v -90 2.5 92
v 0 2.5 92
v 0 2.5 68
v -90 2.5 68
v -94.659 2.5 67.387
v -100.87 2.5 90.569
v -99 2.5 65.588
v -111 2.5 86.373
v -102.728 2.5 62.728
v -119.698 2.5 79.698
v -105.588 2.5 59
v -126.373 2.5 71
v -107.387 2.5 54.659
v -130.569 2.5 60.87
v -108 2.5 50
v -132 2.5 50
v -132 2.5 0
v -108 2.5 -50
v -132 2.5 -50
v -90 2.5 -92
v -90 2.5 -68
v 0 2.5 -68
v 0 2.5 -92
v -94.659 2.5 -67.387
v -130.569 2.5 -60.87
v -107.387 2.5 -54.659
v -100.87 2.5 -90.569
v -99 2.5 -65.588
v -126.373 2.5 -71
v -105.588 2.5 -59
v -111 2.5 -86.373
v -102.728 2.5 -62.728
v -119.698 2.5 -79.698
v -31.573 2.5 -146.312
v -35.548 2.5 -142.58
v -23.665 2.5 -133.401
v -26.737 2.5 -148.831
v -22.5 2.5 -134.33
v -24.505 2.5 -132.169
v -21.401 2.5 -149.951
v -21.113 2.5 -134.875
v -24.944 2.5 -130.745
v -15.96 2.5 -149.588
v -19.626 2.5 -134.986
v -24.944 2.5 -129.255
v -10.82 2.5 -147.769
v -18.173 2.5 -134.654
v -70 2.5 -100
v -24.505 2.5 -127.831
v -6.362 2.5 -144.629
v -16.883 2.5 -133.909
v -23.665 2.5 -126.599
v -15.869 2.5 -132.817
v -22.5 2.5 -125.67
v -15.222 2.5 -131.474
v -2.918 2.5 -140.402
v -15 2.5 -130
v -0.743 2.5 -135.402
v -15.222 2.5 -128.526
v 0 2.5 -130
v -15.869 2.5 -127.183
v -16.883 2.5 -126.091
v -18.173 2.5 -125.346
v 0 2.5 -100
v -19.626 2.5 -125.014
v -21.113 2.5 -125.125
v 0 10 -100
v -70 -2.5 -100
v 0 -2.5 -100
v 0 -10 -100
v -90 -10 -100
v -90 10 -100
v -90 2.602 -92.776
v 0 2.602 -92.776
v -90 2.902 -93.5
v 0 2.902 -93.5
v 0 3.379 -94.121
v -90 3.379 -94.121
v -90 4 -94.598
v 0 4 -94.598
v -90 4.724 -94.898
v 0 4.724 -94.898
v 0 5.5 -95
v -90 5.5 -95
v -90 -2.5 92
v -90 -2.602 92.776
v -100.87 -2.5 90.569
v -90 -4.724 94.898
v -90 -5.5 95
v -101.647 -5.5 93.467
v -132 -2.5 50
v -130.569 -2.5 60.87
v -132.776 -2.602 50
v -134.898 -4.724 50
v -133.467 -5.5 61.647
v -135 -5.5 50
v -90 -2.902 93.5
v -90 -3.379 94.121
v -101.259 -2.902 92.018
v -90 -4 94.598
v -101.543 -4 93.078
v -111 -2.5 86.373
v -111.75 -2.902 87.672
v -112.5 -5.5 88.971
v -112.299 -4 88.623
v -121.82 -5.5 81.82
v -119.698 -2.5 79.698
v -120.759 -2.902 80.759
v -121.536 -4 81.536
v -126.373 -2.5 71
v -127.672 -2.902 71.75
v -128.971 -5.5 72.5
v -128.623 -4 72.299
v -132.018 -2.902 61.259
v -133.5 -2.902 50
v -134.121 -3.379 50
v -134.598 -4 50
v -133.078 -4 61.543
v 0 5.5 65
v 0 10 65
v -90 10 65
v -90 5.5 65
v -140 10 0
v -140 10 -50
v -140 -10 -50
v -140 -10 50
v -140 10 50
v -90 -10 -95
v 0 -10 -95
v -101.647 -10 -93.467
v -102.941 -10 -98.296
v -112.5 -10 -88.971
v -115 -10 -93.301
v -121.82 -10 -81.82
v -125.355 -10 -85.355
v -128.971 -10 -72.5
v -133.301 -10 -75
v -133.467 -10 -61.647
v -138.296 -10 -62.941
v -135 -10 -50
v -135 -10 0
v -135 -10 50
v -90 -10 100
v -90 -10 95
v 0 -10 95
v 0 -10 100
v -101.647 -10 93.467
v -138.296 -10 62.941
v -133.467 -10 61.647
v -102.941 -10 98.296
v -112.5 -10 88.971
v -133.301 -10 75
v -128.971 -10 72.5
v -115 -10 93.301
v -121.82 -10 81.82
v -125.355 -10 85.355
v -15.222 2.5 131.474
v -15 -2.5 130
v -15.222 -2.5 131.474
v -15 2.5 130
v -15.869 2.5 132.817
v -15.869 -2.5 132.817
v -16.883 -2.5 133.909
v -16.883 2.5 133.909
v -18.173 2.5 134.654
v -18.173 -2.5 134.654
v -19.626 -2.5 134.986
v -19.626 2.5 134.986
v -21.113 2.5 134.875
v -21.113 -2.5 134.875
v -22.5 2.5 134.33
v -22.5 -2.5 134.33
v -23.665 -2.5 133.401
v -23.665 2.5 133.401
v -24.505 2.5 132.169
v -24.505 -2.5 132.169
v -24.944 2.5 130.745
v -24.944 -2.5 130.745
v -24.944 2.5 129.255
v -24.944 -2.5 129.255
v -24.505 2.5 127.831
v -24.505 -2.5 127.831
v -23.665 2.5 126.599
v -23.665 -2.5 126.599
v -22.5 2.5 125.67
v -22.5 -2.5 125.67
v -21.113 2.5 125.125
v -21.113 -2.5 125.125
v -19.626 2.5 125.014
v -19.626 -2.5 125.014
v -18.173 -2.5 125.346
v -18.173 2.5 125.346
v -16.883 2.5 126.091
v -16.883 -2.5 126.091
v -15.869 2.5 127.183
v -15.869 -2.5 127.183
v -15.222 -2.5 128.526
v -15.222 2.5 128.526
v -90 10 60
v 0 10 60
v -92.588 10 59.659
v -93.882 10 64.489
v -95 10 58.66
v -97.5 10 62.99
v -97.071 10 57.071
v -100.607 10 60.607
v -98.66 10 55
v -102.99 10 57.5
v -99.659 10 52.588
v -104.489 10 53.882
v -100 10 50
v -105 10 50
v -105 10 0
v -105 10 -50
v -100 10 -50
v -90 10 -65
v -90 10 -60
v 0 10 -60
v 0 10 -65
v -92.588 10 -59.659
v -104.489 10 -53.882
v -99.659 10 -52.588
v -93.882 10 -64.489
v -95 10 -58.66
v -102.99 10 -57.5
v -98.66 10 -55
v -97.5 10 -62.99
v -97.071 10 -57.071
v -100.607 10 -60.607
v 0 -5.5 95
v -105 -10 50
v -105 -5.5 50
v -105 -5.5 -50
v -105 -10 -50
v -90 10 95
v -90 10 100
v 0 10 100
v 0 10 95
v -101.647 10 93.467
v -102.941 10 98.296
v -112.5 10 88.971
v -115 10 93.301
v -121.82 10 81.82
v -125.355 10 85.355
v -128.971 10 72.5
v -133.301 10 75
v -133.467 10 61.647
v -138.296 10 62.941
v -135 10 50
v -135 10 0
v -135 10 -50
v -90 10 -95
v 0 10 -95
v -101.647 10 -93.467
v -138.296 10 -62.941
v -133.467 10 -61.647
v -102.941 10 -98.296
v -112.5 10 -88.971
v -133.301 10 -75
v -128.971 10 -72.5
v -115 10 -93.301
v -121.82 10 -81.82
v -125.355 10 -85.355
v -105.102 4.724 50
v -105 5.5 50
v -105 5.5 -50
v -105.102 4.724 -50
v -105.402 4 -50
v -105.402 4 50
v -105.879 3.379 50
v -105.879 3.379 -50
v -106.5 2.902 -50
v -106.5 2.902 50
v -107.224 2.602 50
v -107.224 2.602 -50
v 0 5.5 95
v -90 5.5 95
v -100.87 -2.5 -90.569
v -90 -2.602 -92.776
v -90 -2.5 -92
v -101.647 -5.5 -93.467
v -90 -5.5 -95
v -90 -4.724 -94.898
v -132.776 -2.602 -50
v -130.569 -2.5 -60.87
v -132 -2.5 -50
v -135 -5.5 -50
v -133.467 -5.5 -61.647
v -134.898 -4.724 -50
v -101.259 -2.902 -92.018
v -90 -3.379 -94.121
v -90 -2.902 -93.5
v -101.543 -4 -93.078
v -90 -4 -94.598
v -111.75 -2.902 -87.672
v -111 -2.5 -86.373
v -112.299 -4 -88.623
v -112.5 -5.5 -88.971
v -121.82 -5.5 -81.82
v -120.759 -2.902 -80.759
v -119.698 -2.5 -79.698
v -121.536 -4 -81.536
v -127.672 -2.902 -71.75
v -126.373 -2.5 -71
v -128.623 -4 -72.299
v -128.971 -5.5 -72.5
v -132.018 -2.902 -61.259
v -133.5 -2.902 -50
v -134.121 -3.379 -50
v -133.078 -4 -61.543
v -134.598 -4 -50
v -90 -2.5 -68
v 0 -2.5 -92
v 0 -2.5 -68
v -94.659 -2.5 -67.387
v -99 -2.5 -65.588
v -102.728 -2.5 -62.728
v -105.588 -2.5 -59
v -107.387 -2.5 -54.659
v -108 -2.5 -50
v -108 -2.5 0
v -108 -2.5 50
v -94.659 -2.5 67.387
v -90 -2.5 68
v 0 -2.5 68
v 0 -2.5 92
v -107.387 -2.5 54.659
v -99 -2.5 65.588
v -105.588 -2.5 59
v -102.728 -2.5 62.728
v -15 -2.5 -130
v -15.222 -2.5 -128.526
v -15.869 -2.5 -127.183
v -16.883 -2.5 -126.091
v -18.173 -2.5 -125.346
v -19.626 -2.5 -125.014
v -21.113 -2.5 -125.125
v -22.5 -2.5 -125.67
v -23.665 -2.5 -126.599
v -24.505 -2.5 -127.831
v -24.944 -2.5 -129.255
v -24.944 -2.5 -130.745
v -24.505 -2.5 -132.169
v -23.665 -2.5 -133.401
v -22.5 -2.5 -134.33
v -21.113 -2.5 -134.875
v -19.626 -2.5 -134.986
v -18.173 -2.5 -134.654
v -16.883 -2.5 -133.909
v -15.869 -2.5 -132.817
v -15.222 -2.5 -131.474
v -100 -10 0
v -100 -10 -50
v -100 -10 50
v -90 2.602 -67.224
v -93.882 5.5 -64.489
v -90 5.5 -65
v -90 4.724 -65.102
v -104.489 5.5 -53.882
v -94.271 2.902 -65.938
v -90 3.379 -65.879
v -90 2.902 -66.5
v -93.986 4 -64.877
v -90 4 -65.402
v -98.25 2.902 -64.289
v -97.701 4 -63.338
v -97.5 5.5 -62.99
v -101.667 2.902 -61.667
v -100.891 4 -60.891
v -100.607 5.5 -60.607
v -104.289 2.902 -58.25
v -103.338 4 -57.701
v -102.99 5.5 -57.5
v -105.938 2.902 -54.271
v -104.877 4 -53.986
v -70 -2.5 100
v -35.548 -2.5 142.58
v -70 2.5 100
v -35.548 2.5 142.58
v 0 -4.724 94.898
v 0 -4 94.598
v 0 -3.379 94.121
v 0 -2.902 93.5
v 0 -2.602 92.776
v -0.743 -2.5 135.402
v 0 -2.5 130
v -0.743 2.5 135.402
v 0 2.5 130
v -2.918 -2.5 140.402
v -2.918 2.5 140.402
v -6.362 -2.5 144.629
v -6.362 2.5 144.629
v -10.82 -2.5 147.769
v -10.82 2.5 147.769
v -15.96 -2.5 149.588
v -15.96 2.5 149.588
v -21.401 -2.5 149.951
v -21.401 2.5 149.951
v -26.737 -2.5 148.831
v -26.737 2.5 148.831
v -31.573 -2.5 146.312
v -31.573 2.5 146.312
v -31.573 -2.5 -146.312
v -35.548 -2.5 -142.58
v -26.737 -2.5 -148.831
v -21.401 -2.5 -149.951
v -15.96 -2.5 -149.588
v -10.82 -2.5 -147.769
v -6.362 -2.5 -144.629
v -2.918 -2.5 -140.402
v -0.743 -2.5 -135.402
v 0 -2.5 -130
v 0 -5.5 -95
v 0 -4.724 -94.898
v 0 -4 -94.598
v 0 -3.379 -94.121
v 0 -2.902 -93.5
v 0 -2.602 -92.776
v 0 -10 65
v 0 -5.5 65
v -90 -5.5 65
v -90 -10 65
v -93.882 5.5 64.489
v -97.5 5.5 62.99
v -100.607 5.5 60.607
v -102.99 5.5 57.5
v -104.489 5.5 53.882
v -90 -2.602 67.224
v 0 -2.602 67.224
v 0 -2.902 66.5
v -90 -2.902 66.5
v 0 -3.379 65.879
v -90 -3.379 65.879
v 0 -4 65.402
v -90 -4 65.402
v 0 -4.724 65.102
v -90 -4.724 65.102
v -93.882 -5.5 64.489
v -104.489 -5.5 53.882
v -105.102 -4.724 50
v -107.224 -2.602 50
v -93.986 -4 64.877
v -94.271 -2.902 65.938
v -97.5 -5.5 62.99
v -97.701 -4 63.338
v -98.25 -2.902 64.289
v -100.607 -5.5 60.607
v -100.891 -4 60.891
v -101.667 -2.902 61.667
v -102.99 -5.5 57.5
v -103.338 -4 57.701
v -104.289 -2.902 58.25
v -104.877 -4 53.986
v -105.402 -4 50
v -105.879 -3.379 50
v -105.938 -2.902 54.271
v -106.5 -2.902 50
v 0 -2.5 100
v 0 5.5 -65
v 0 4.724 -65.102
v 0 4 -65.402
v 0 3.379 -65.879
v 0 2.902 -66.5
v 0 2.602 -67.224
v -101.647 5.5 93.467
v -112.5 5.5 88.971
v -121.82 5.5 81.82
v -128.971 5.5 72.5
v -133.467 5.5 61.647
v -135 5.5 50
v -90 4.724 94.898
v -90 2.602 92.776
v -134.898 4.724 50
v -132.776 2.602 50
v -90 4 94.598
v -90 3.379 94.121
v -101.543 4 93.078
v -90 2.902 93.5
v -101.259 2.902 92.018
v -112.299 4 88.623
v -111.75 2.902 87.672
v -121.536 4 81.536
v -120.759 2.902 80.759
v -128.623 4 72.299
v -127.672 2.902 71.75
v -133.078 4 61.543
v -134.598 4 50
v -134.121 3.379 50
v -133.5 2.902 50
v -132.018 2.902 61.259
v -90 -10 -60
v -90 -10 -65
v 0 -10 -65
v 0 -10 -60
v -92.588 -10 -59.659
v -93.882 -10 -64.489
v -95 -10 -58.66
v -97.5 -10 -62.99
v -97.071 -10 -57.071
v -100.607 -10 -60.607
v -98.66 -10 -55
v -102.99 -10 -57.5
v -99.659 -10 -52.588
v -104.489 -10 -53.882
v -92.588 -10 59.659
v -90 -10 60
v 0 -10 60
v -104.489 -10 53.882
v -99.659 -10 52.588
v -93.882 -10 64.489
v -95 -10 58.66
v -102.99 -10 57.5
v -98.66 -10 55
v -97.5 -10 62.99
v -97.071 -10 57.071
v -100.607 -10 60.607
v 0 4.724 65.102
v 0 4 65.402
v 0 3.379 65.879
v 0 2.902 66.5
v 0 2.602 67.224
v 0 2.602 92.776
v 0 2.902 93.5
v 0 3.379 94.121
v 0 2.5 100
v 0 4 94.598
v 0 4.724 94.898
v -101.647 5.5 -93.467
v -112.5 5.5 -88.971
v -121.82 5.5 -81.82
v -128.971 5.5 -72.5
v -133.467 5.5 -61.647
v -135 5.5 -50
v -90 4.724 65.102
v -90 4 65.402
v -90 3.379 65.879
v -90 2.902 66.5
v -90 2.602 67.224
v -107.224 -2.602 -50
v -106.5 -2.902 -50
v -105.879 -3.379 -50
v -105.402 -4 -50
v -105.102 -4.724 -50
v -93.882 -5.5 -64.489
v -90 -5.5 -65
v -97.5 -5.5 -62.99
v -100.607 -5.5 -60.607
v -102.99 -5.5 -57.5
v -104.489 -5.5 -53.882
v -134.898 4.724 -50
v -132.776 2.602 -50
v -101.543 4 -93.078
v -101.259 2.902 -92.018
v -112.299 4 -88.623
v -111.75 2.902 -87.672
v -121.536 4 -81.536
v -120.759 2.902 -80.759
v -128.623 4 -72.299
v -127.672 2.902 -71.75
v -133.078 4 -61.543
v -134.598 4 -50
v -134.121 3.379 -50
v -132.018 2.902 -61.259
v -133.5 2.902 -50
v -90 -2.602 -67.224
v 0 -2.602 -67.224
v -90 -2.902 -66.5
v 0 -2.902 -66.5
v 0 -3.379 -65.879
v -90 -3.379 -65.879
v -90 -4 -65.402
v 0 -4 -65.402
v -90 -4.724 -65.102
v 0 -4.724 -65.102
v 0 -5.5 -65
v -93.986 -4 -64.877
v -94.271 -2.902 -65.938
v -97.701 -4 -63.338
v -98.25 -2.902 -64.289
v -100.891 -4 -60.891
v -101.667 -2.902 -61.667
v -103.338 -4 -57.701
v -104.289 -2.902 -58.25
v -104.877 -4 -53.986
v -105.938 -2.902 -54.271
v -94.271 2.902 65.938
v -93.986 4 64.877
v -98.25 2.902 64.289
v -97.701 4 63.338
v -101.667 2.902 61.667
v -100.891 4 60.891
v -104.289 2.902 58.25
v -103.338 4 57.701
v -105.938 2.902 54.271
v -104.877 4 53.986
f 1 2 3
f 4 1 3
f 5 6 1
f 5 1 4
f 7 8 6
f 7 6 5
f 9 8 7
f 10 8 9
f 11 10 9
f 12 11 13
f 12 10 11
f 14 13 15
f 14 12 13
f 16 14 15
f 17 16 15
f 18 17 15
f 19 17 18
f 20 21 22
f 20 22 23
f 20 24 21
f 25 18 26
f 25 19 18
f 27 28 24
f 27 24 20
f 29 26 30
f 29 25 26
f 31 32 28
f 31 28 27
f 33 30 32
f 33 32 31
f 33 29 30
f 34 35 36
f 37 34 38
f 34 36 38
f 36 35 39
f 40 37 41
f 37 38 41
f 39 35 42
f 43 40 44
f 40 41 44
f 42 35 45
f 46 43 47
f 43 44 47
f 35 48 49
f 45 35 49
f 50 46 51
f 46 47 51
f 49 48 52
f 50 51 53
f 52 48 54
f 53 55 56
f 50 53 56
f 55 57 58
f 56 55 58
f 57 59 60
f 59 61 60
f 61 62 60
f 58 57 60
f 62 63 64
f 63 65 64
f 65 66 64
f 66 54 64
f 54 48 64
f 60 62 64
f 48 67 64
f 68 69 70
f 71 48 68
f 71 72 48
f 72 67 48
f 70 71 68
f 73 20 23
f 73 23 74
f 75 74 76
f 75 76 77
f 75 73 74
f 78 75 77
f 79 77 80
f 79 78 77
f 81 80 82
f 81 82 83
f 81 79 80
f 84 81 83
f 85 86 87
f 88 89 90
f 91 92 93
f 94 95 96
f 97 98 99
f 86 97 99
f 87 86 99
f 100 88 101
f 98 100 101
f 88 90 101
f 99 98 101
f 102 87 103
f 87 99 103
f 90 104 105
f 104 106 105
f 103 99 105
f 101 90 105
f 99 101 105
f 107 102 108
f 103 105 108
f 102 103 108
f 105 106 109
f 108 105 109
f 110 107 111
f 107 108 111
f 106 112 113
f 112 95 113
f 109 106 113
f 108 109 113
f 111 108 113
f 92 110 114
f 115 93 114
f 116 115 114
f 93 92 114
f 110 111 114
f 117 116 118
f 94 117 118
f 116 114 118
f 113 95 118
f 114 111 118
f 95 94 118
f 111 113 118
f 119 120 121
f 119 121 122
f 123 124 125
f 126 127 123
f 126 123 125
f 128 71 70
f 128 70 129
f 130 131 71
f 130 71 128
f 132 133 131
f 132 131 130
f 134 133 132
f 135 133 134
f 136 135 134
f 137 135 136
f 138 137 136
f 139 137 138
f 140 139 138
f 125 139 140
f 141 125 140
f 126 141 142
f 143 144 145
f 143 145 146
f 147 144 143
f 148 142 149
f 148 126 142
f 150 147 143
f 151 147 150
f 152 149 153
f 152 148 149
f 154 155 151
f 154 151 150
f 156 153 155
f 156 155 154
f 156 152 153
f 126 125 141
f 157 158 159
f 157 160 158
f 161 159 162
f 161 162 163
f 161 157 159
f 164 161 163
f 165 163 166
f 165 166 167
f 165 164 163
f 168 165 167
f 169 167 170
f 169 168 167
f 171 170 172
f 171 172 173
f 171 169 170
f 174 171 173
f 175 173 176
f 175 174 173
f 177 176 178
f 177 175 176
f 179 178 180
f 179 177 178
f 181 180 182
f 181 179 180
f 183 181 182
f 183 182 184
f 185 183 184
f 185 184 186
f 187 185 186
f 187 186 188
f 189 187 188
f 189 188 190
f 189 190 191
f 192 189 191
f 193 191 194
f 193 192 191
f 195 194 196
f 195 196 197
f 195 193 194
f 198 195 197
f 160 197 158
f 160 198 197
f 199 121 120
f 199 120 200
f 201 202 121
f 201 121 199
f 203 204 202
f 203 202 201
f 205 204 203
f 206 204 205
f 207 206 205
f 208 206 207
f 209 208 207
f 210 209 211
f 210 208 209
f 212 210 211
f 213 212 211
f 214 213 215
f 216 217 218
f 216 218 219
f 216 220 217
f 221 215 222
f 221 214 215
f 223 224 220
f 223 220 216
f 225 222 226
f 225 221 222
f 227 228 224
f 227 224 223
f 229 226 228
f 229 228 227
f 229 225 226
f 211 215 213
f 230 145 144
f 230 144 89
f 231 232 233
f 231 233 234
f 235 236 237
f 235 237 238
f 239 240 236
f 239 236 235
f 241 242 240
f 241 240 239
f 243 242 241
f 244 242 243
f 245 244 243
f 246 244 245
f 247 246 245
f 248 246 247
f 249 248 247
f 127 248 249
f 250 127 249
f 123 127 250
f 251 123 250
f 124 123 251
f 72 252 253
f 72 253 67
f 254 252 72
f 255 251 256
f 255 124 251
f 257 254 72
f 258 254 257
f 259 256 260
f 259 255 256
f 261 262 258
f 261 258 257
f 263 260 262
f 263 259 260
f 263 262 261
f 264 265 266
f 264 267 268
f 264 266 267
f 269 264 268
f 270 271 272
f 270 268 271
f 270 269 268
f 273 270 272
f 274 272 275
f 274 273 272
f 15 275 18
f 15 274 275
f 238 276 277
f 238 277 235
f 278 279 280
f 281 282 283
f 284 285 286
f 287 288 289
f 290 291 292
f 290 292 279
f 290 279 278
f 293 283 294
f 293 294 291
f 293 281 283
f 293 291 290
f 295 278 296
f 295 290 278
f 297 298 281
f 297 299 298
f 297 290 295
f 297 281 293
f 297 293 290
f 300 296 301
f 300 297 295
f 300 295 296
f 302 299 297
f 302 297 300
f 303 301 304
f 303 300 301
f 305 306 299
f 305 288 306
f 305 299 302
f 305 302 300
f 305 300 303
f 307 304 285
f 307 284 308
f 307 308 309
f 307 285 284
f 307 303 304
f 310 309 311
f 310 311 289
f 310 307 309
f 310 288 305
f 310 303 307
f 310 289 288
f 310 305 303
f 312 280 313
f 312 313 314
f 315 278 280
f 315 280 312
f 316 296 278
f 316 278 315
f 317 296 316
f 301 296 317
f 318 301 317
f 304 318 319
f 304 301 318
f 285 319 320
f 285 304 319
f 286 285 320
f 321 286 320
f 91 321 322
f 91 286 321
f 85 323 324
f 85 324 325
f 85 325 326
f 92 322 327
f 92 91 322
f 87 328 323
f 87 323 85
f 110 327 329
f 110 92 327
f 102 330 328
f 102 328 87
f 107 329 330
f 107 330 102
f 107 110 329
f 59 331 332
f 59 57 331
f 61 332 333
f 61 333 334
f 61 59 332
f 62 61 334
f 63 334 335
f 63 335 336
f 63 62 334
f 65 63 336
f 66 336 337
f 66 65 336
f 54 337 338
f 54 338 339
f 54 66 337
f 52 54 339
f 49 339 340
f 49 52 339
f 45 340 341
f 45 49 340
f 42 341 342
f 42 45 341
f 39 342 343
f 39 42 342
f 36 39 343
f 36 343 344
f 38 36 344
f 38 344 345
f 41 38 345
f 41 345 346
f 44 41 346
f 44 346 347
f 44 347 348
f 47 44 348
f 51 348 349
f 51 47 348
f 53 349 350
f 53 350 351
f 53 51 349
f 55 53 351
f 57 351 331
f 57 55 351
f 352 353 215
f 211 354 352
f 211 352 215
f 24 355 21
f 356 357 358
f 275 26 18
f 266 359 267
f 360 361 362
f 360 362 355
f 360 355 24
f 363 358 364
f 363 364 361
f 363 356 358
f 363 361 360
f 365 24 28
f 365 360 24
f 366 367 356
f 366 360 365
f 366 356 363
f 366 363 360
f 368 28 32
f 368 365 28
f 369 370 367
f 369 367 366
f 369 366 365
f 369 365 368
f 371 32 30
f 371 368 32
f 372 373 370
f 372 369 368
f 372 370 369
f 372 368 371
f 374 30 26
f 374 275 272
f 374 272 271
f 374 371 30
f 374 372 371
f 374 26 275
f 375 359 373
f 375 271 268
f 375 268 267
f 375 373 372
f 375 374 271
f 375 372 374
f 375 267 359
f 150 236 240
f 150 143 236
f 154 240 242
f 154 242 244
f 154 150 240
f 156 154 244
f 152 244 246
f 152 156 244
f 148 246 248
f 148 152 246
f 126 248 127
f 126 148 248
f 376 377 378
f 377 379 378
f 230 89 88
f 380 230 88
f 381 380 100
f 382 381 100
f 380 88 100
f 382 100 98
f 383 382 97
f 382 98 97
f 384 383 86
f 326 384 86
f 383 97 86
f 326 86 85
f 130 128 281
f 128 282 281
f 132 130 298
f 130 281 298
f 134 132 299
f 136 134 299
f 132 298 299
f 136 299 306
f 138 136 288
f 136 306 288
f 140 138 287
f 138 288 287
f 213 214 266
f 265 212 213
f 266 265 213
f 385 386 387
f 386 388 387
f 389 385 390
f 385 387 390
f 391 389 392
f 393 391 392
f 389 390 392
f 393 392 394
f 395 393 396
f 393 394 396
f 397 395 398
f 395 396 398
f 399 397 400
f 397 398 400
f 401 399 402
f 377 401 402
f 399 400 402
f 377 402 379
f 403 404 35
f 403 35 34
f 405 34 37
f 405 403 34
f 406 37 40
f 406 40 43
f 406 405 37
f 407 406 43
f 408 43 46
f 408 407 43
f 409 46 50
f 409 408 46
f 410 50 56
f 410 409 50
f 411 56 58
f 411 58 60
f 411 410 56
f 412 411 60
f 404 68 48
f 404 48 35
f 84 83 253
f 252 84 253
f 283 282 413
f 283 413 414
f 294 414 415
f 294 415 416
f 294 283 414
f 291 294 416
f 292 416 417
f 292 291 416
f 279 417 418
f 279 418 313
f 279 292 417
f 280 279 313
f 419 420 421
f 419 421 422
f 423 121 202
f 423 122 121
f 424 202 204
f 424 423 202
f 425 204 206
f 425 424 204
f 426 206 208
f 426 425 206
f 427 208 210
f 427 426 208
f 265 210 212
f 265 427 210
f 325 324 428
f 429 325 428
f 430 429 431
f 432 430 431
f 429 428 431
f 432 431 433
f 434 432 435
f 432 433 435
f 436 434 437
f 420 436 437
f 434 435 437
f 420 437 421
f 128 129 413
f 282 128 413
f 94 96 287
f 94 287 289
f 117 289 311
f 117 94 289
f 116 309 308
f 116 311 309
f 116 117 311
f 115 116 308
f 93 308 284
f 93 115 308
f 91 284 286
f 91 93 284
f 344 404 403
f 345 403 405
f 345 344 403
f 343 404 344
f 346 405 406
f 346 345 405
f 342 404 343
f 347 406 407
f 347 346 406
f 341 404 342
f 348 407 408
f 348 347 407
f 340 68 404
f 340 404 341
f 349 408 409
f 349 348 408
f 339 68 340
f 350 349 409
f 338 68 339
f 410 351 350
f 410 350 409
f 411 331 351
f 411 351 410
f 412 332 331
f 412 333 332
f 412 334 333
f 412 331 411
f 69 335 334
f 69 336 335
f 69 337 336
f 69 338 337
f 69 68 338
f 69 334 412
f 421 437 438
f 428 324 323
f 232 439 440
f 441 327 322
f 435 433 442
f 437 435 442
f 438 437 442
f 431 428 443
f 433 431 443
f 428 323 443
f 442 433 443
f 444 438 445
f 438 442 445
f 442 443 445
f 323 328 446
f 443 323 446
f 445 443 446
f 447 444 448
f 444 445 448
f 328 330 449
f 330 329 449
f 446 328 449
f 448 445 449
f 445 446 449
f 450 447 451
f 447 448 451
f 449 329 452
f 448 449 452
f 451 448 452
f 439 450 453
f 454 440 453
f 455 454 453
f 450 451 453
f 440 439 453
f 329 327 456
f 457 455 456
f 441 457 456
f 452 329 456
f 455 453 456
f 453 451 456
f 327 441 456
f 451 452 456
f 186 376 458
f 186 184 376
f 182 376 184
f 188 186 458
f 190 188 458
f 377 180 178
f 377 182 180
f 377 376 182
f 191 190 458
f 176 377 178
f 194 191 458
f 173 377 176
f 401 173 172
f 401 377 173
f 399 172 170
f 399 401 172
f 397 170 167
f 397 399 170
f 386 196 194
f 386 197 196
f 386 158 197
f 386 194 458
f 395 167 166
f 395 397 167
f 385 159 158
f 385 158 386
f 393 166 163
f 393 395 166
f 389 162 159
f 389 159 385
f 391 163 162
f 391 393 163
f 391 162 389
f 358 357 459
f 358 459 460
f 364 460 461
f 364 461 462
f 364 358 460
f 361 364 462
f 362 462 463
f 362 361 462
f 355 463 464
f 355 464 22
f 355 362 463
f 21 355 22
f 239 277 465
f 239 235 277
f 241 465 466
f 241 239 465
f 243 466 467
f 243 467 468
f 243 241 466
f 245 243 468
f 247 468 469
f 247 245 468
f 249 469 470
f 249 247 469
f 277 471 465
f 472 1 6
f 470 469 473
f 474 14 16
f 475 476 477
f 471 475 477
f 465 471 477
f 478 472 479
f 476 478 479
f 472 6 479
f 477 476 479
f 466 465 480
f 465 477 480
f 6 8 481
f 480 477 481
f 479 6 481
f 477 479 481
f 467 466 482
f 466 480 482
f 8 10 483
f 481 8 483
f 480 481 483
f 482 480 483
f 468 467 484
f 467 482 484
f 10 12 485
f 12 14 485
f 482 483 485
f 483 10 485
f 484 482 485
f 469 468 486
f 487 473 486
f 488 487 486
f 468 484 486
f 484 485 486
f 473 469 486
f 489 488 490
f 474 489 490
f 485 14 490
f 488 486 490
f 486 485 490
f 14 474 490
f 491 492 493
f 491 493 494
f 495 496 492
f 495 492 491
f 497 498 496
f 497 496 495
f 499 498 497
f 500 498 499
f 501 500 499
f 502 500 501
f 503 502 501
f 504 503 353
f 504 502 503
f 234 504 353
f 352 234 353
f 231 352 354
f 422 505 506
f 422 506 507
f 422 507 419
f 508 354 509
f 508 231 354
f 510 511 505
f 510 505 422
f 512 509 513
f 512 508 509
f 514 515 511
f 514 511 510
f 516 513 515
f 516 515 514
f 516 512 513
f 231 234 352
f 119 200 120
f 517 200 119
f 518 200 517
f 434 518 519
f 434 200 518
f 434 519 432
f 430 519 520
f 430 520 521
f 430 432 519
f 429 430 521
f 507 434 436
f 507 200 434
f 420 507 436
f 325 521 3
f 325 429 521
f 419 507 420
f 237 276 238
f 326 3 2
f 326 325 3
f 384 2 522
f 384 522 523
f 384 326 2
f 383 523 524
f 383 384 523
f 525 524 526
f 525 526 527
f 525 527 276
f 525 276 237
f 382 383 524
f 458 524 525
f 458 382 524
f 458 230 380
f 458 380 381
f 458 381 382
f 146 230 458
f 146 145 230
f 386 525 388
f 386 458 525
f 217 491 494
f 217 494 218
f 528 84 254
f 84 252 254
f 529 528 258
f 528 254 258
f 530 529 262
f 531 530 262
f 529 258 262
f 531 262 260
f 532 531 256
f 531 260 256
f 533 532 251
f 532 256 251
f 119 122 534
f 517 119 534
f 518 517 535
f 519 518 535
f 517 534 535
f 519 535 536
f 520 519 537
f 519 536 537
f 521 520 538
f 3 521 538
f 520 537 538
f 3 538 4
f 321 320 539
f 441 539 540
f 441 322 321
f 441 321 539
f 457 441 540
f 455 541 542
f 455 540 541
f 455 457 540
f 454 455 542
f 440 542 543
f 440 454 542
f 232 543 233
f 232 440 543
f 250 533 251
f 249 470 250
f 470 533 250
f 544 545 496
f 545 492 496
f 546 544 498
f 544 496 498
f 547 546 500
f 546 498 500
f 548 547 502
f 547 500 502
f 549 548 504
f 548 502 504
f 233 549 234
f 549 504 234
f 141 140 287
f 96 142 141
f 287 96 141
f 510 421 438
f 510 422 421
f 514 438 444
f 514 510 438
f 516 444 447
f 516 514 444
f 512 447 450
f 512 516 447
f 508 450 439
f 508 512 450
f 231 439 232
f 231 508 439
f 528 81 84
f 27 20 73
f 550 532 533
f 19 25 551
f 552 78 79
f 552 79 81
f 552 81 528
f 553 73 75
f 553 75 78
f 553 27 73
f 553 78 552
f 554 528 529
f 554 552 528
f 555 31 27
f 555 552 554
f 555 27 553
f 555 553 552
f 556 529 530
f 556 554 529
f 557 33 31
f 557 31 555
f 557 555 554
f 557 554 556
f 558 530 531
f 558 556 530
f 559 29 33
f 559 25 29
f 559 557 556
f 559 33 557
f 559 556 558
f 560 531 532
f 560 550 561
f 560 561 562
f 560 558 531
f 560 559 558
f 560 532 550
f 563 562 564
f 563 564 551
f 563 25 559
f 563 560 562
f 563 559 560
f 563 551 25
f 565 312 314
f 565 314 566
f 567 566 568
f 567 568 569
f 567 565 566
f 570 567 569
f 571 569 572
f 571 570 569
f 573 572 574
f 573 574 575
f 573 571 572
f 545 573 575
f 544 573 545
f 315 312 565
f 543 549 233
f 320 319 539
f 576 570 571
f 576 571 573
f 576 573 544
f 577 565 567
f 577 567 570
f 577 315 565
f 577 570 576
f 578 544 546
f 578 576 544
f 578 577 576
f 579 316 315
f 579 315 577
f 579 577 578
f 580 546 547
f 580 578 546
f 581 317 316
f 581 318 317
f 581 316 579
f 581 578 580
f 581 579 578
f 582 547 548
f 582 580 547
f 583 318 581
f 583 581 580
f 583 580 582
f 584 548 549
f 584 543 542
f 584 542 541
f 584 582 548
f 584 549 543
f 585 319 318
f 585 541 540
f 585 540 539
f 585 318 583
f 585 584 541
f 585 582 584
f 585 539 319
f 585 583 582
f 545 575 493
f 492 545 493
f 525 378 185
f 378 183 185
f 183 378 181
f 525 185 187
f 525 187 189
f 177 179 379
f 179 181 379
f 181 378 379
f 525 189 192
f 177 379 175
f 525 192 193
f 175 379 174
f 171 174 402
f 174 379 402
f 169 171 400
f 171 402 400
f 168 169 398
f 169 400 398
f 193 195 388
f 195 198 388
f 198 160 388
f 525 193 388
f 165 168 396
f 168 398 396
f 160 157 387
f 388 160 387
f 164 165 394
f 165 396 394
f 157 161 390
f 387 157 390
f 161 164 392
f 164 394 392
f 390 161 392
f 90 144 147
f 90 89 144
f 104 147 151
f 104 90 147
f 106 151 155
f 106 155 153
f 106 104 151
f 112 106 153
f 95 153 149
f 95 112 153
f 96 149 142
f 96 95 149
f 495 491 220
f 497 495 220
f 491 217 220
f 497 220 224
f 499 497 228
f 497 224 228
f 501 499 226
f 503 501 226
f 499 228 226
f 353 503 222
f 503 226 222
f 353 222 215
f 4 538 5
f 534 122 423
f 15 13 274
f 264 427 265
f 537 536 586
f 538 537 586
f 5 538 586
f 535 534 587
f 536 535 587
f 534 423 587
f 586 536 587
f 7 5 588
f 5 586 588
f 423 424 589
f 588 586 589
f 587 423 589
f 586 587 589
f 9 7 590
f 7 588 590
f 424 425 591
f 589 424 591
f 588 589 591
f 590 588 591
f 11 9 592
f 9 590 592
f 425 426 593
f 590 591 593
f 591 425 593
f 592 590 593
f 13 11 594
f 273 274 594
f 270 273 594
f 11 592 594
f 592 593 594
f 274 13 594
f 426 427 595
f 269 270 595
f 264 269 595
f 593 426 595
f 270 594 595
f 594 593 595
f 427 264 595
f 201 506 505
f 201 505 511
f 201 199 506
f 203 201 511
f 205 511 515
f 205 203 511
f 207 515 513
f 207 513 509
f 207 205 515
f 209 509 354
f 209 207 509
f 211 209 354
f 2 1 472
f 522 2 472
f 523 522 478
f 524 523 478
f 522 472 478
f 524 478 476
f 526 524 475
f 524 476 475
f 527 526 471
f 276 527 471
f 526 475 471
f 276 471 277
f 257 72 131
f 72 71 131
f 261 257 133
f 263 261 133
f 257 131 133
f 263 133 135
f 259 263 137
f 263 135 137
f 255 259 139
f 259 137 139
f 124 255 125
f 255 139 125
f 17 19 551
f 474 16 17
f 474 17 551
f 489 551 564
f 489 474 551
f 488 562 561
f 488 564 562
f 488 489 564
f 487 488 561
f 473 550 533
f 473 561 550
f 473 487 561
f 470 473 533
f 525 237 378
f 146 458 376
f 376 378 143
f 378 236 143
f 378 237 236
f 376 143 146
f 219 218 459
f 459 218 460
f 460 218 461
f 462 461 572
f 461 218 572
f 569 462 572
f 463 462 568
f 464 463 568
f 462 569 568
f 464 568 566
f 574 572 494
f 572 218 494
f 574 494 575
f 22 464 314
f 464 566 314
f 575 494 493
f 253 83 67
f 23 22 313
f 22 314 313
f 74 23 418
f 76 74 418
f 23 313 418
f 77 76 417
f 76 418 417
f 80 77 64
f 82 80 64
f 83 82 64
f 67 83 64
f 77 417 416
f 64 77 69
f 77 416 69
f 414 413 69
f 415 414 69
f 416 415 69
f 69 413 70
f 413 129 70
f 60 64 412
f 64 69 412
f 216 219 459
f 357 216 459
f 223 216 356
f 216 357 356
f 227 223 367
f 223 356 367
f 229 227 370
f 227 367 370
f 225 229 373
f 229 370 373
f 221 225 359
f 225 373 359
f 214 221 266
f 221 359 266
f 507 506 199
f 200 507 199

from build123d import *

# Parameters (mm, degrees)
F4_R     = 5
F5_DEPTH = 2.5


with BuildPart() as f2:
    # F2: sweep along a path in F0
    with BuildLine(Plane.XZ) as f2_path:
        Line((0, 60), (-90, 60))
        ThreePointArc((-90, 60), (-97.0710678119, 57.0710678119), (-100, 50))
        Line((-100, 50), (-100, 0))
    # F1 (on Right) → F2 (sweep)
    with BuildSketch(Plane.YZ):
        with BuildLine():
            Line((10, 95), (10, 100))
            Line((10, 100), (-10, 100))
            Line((-10, 100), (-10, 95))
            Line((-10, 95), (-5.5, 95))
            ThreePointArc((-5.5, 95), (-3.3786796564, 94.1213203436), (-2.5, 92))
            Line((-2.5, 92), (-2.5, 68))
            ThreePointArc((-2.5, 68), (-3.3786796564, 65.8786796564), (-5.5, 65))
            Line((-5.5, 65), (-10, 65))
            Line((-10, 65), (-10, 60))
            Line((-10, 60), (0, 60))
            Line((0, 60), (10, 60))
            Line((10, 60), (10, 65))
            Line((10, 65), (5.5, 65))
            ThreePointArc((5.5, 65), (3.3786796564, 65.8786796564), (2.5, 68))
            Line((2.5, 68), (2.5, 92))
            ThreePointArc((2.5, 92), (3.3786796564, 94.1213203436), (5.5, 95))
            Line((5.5, 95), (10, 95))
        make_face()
    sweep(path=f2_path.line)

    # F3: F2 across plane


with BuildPart() as f2_1:
    add(f2.part)
    add(f2.part.mirror(Plane.XY))

    # F4 (on Front) → F5 (join, symmetric)
    with BuildSketch(Plane.XZ):
        with BuildLine():
            Line((0, 100), (0, 130))
            ThreePointArc((0, 130), (-13.3277028936, 148.8541892248), (-35.5480451324, 142.5800752207))
            Line((-35.5480451324, 142.5800752207), (-70, 100))
            Line((-70, 100), (0, 100))
        make_face()
        with Locations((-20, 130)):
            Circle(F4_R, mode=Mode.SUBTRACT)
        with BuildLine():
            Line((0, -100), (-70, -100))
            Line((-70, -100), (-35.5480451324, -142.5800752207))
            ThreePointArc((-35.5480451324, -142.5800752207), (-13.3277028936, -148.8541892248), (0, -130))
            Line((0, -130), (0, -100))
        make_face()
        with Locations((-20, -130)):
            Circle(F4_R, mode=Mode.SUBTRACT)
    extrude(amount=F5_DEPTH, both=True)


solid = f2_1.part
